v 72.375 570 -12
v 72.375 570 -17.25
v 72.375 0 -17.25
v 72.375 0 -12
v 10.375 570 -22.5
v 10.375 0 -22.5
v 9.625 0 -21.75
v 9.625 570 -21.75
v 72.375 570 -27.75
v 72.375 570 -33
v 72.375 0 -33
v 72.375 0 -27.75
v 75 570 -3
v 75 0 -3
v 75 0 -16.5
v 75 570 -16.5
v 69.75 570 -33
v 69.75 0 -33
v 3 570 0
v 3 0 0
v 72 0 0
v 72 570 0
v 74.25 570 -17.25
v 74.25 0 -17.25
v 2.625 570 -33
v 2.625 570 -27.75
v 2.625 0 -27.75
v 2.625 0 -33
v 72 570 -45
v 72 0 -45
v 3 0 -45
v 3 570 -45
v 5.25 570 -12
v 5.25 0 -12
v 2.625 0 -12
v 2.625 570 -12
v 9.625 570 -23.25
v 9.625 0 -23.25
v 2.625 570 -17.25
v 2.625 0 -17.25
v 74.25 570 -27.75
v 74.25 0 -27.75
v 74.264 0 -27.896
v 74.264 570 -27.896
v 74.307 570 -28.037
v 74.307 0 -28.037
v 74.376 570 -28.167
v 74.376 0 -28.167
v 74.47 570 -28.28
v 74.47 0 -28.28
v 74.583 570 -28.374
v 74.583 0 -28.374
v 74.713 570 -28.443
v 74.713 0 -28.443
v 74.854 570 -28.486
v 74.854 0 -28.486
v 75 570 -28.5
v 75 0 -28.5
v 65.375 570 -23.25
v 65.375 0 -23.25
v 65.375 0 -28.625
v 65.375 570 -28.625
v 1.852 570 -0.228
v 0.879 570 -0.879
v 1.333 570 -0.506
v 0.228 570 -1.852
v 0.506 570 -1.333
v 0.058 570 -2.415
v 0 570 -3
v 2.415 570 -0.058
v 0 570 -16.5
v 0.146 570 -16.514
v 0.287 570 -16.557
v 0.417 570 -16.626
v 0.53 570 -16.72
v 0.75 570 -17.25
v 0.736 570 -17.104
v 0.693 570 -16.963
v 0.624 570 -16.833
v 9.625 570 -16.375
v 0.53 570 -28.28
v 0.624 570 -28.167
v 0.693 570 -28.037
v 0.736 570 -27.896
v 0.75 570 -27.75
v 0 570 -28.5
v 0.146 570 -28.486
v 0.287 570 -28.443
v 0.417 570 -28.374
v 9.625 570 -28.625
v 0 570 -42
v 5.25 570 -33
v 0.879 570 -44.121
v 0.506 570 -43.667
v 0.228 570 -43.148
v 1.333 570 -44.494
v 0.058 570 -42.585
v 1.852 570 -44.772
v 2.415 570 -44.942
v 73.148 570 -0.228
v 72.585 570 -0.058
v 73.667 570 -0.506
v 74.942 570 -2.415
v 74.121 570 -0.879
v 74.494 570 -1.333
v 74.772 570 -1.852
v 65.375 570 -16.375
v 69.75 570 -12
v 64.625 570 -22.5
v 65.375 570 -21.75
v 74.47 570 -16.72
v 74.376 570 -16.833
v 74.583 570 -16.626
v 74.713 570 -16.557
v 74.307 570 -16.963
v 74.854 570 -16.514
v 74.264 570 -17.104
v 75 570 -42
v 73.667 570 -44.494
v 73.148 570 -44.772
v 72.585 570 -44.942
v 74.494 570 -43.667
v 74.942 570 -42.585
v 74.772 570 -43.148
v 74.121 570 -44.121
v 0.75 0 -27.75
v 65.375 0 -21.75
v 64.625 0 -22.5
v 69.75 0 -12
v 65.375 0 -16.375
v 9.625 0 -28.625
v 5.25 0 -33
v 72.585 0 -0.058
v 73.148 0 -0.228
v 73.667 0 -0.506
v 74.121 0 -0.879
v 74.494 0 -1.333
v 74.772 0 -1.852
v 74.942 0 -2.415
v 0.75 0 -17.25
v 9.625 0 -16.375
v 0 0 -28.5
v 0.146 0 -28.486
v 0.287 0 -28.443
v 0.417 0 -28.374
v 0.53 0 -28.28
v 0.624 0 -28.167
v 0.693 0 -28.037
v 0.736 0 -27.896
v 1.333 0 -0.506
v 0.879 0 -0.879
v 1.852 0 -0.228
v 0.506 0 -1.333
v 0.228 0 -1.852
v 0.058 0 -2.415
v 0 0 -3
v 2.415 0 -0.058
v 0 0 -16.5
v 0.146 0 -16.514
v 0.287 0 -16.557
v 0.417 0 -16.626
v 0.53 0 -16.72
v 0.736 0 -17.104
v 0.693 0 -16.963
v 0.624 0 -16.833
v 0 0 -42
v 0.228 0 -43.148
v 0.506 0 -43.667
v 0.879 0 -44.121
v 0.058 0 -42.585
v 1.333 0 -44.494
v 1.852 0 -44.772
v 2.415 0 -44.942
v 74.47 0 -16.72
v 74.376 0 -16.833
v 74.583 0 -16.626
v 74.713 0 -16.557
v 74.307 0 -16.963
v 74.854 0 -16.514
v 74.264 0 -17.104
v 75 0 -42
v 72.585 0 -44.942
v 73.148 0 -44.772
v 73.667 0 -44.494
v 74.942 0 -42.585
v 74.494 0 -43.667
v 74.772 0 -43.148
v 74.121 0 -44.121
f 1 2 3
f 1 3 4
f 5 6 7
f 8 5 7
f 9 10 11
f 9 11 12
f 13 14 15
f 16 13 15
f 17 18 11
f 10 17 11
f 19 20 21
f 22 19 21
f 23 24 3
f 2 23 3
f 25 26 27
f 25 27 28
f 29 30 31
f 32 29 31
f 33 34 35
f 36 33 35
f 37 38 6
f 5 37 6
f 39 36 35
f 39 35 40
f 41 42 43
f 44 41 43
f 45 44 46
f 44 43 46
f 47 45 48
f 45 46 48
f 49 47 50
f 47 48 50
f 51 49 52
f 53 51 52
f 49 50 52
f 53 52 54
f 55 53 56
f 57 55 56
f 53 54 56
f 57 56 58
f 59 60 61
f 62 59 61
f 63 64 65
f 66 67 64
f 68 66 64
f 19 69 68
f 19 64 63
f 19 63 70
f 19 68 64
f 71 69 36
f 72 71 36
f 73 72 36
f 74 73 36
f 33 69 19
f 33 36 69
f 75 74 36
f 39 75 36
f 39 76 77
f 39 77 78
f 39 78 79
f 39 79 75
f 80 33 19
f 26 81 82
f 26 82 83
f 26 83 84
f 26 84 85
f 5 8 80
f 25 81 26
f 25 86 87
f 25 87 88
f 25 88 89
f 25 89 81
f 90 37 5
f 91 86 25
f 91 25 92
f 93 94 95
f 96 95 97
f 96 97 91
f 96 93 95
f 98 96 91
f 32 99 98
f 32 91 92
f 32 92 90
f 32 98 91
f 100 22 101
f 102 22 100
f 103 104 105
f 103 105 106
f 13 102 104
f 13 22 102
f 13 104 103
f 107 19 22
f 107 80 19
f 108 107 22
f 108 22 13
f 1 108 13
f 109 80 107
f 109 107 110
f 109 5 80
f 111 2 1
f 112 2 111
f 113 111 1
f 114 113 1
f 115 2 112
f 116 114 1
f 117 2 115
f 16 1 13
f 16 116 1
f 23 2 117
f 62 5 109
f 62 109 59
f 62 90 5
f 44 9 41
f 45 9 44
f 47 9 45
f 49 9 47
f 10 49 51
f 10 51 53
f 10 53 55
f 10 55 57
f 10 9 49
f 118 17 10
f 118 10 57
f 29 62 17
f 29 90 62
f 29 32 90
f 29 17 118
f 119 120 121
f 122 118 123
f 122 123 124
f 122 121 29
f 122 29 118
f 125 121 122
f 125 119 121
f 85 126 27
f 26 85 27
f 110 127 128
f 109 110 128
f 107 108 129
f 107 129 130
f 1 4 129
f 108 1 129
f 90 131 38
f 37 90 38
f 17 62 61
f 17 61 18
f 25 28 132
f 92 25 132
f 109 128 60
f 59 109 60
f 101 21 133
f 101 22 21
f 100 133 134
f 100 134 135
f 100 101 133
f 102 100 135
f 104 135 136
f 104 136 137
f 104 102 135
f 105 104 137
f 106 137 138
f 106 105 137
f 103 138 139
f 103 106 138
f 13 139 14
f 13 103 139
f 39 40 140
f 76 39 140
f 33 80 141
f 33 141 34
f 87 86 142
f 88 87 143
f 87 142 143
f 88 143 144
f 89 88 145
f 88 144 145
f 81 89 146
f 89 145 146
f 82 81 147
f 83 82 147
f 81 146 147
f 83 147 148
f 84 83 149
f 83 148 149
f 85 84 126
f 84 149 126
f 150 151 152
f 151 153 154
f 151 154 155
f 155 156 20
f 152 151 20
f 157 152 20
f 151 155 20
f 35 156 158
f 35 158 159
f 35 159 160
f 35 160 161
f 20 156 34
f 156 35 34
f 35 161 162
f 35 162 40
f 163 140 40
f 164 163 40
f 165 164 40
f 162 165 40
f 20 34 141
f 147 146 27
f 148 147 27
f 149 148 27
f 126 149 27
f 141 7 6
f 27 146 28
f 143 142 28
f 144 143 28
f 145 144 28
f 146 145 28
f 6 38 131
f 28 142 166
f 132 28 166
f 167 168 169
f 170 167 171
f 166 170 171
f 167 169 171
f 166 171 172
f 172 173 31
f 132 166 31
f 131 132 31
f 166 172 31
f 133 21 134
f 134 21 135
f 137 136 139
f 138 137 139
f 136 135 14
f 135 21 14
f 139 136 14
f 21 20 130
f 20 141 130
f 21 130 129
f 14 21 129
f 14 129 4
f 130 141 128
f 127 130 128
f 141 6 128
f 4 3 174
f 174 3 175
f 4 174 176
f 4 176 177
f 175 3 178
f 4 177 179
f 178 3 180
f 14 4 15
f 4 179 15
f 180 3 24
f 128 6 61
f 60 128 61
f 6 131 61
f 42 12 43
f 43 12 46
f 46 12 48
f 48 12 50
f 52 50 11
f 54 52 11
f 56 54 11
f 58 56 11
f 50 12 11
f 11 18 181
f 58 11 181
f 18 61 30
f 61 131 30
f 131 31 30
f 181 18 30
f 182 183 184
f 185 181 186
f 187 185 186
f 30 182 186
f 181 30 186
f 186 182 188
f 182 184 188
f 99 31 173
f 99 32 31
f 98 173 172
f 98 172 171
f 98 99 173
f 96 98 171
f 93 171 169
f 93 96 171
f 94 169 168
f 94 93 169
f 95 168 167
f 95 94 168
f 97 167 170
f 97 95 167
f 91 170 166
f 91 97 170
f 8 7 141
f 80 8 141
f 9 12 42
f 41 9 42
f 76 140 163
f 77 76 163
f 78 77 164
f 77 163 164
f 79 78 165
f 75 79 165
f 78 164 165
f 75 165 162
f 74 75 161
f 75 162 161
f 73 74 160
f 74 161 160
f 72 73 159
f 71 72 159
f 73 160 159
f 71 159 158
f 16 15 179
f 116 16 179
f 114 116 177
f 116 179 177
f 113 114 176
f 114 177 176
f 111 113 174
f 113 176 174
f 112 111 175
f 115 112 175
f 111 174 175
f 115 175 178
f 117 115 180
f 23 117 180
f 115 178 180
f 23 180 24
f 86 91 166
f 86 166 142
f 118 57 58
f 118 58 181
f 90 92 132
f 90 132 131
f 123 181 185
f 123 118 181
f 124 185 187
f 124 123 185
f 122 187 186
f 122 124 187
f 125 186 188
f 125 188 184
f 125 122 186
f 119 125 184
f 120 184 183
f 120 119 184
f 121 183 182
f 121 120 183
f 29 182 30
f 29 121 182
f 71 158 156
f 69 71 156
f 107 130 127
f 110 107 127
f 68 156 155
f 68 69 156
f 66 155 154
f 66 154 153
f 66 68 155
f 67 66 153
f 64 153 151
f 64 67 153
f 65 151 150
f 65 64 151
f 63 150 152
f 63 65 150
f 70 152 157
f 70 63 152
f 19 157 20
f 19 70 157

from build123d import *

# Parameters (mm, degrees)
BOSS_EXTRUDE1_DEPTH = 570
FILLET1_R           = 3


with BuildPart() as part:
    # Sketch1 → Boss-Extrude1 (new body)
    with BuildSketch(Plane(origin=(0, 0, 0), x_dir=(1, 0, 0), z_dir=(0, 1, 0))):
        with BuildLine():
            Line((2.625, 17.250000178), (0.75, 17.250000178))
            ThreePointArc((0.75, 17.250000178), (0.530330086, 16.719670092), (0, 16.500000178))
            Line((0, 16.500000178), (0, 0))
            Line((0, 0), (75, 0))
            Line((75, 0), (75, 16.500000178))
            ThreePointArc((75, 16.500000178), (74.469669914, 16.719670092), (74.25, 17.250000178))
            Line((74.25, 17.250000178), (72.375, 17.250000178))
            Line((72.375, 17.250000178), (72.375, 12.000000178))
            Line((72.375, 12.000000178), (69.75, 12.000000178))
            Line((69.75, 12.000000178), (65.375, 16.375))
            Line((65.375, 16.375), (65.375, 21.75))
            Line((65.375, 21.75), (64.625, 22.5))
            Line((64.625, 22.5), (65.375, 23.25))
            Line((65.375, 23.25), (65.375, 28.625))
            Line((65.375, 28.625), (69.75, 33.000000178))
            Line((69.75, 33.000000178), (72.375, 33.000000178))
            Line((72.375, 33.000000178), (72.375, 27.750000178))
            Line((72.375, 27.750000178), (74.25, 27.750000178))
            ThreePointArc((74.25, 27.750000178), (74.469669914, 28.280330264), (75, 28.500000178))
            Line((75, 28.500000178), (75, 45))
            Line((75, 45), (0, 45))
            Line((0, 45), (0, 28.500000178))
            ThreePointArc((0, 28.500000178), (0.530330086, 28.280330264), (0.75, 27.750000178))
            Line((0.75, 27.750000178), (2.625, 27.750000178))
            Line((2.625, 27.750000178), (2.625, 33.000000178))
            Line((2.625, 33.000000178), (5.25, 33.000000178))
            Line((5.25, 33.000000178), (9.625, 28.625))
            Line((9.625, 28.625), (9.625, 23.25))
            Line((9.625, 23.25), (10.375, 22.5))
            Line((10.375, 22.5), (9.625, 21.75))
            Line((9.625, 21.75), (9.625, 16.375))
            Line((9.625, 16.375), (5.25, 12.000000178))
            Line((5.25, 12.000000178), (2.625, 12.000000178))
            Line((2.625, 12.000000178), (2.625, 17.250000178))
        make_face()
    extrude(amount=BOSS_EXTRUDE1_DEPTH)

    # Fillet1
    fillet1_edges = [part.edges().sort_by_distance(p)[0] for p in [
        (0, 285, 0),
        (0, 285, -45),
        (75, 285, -45),
        (75, 285, 0),
    ]]
    fillet(fillet1_edges, radius=FILLET1_R)


solid = part.part
